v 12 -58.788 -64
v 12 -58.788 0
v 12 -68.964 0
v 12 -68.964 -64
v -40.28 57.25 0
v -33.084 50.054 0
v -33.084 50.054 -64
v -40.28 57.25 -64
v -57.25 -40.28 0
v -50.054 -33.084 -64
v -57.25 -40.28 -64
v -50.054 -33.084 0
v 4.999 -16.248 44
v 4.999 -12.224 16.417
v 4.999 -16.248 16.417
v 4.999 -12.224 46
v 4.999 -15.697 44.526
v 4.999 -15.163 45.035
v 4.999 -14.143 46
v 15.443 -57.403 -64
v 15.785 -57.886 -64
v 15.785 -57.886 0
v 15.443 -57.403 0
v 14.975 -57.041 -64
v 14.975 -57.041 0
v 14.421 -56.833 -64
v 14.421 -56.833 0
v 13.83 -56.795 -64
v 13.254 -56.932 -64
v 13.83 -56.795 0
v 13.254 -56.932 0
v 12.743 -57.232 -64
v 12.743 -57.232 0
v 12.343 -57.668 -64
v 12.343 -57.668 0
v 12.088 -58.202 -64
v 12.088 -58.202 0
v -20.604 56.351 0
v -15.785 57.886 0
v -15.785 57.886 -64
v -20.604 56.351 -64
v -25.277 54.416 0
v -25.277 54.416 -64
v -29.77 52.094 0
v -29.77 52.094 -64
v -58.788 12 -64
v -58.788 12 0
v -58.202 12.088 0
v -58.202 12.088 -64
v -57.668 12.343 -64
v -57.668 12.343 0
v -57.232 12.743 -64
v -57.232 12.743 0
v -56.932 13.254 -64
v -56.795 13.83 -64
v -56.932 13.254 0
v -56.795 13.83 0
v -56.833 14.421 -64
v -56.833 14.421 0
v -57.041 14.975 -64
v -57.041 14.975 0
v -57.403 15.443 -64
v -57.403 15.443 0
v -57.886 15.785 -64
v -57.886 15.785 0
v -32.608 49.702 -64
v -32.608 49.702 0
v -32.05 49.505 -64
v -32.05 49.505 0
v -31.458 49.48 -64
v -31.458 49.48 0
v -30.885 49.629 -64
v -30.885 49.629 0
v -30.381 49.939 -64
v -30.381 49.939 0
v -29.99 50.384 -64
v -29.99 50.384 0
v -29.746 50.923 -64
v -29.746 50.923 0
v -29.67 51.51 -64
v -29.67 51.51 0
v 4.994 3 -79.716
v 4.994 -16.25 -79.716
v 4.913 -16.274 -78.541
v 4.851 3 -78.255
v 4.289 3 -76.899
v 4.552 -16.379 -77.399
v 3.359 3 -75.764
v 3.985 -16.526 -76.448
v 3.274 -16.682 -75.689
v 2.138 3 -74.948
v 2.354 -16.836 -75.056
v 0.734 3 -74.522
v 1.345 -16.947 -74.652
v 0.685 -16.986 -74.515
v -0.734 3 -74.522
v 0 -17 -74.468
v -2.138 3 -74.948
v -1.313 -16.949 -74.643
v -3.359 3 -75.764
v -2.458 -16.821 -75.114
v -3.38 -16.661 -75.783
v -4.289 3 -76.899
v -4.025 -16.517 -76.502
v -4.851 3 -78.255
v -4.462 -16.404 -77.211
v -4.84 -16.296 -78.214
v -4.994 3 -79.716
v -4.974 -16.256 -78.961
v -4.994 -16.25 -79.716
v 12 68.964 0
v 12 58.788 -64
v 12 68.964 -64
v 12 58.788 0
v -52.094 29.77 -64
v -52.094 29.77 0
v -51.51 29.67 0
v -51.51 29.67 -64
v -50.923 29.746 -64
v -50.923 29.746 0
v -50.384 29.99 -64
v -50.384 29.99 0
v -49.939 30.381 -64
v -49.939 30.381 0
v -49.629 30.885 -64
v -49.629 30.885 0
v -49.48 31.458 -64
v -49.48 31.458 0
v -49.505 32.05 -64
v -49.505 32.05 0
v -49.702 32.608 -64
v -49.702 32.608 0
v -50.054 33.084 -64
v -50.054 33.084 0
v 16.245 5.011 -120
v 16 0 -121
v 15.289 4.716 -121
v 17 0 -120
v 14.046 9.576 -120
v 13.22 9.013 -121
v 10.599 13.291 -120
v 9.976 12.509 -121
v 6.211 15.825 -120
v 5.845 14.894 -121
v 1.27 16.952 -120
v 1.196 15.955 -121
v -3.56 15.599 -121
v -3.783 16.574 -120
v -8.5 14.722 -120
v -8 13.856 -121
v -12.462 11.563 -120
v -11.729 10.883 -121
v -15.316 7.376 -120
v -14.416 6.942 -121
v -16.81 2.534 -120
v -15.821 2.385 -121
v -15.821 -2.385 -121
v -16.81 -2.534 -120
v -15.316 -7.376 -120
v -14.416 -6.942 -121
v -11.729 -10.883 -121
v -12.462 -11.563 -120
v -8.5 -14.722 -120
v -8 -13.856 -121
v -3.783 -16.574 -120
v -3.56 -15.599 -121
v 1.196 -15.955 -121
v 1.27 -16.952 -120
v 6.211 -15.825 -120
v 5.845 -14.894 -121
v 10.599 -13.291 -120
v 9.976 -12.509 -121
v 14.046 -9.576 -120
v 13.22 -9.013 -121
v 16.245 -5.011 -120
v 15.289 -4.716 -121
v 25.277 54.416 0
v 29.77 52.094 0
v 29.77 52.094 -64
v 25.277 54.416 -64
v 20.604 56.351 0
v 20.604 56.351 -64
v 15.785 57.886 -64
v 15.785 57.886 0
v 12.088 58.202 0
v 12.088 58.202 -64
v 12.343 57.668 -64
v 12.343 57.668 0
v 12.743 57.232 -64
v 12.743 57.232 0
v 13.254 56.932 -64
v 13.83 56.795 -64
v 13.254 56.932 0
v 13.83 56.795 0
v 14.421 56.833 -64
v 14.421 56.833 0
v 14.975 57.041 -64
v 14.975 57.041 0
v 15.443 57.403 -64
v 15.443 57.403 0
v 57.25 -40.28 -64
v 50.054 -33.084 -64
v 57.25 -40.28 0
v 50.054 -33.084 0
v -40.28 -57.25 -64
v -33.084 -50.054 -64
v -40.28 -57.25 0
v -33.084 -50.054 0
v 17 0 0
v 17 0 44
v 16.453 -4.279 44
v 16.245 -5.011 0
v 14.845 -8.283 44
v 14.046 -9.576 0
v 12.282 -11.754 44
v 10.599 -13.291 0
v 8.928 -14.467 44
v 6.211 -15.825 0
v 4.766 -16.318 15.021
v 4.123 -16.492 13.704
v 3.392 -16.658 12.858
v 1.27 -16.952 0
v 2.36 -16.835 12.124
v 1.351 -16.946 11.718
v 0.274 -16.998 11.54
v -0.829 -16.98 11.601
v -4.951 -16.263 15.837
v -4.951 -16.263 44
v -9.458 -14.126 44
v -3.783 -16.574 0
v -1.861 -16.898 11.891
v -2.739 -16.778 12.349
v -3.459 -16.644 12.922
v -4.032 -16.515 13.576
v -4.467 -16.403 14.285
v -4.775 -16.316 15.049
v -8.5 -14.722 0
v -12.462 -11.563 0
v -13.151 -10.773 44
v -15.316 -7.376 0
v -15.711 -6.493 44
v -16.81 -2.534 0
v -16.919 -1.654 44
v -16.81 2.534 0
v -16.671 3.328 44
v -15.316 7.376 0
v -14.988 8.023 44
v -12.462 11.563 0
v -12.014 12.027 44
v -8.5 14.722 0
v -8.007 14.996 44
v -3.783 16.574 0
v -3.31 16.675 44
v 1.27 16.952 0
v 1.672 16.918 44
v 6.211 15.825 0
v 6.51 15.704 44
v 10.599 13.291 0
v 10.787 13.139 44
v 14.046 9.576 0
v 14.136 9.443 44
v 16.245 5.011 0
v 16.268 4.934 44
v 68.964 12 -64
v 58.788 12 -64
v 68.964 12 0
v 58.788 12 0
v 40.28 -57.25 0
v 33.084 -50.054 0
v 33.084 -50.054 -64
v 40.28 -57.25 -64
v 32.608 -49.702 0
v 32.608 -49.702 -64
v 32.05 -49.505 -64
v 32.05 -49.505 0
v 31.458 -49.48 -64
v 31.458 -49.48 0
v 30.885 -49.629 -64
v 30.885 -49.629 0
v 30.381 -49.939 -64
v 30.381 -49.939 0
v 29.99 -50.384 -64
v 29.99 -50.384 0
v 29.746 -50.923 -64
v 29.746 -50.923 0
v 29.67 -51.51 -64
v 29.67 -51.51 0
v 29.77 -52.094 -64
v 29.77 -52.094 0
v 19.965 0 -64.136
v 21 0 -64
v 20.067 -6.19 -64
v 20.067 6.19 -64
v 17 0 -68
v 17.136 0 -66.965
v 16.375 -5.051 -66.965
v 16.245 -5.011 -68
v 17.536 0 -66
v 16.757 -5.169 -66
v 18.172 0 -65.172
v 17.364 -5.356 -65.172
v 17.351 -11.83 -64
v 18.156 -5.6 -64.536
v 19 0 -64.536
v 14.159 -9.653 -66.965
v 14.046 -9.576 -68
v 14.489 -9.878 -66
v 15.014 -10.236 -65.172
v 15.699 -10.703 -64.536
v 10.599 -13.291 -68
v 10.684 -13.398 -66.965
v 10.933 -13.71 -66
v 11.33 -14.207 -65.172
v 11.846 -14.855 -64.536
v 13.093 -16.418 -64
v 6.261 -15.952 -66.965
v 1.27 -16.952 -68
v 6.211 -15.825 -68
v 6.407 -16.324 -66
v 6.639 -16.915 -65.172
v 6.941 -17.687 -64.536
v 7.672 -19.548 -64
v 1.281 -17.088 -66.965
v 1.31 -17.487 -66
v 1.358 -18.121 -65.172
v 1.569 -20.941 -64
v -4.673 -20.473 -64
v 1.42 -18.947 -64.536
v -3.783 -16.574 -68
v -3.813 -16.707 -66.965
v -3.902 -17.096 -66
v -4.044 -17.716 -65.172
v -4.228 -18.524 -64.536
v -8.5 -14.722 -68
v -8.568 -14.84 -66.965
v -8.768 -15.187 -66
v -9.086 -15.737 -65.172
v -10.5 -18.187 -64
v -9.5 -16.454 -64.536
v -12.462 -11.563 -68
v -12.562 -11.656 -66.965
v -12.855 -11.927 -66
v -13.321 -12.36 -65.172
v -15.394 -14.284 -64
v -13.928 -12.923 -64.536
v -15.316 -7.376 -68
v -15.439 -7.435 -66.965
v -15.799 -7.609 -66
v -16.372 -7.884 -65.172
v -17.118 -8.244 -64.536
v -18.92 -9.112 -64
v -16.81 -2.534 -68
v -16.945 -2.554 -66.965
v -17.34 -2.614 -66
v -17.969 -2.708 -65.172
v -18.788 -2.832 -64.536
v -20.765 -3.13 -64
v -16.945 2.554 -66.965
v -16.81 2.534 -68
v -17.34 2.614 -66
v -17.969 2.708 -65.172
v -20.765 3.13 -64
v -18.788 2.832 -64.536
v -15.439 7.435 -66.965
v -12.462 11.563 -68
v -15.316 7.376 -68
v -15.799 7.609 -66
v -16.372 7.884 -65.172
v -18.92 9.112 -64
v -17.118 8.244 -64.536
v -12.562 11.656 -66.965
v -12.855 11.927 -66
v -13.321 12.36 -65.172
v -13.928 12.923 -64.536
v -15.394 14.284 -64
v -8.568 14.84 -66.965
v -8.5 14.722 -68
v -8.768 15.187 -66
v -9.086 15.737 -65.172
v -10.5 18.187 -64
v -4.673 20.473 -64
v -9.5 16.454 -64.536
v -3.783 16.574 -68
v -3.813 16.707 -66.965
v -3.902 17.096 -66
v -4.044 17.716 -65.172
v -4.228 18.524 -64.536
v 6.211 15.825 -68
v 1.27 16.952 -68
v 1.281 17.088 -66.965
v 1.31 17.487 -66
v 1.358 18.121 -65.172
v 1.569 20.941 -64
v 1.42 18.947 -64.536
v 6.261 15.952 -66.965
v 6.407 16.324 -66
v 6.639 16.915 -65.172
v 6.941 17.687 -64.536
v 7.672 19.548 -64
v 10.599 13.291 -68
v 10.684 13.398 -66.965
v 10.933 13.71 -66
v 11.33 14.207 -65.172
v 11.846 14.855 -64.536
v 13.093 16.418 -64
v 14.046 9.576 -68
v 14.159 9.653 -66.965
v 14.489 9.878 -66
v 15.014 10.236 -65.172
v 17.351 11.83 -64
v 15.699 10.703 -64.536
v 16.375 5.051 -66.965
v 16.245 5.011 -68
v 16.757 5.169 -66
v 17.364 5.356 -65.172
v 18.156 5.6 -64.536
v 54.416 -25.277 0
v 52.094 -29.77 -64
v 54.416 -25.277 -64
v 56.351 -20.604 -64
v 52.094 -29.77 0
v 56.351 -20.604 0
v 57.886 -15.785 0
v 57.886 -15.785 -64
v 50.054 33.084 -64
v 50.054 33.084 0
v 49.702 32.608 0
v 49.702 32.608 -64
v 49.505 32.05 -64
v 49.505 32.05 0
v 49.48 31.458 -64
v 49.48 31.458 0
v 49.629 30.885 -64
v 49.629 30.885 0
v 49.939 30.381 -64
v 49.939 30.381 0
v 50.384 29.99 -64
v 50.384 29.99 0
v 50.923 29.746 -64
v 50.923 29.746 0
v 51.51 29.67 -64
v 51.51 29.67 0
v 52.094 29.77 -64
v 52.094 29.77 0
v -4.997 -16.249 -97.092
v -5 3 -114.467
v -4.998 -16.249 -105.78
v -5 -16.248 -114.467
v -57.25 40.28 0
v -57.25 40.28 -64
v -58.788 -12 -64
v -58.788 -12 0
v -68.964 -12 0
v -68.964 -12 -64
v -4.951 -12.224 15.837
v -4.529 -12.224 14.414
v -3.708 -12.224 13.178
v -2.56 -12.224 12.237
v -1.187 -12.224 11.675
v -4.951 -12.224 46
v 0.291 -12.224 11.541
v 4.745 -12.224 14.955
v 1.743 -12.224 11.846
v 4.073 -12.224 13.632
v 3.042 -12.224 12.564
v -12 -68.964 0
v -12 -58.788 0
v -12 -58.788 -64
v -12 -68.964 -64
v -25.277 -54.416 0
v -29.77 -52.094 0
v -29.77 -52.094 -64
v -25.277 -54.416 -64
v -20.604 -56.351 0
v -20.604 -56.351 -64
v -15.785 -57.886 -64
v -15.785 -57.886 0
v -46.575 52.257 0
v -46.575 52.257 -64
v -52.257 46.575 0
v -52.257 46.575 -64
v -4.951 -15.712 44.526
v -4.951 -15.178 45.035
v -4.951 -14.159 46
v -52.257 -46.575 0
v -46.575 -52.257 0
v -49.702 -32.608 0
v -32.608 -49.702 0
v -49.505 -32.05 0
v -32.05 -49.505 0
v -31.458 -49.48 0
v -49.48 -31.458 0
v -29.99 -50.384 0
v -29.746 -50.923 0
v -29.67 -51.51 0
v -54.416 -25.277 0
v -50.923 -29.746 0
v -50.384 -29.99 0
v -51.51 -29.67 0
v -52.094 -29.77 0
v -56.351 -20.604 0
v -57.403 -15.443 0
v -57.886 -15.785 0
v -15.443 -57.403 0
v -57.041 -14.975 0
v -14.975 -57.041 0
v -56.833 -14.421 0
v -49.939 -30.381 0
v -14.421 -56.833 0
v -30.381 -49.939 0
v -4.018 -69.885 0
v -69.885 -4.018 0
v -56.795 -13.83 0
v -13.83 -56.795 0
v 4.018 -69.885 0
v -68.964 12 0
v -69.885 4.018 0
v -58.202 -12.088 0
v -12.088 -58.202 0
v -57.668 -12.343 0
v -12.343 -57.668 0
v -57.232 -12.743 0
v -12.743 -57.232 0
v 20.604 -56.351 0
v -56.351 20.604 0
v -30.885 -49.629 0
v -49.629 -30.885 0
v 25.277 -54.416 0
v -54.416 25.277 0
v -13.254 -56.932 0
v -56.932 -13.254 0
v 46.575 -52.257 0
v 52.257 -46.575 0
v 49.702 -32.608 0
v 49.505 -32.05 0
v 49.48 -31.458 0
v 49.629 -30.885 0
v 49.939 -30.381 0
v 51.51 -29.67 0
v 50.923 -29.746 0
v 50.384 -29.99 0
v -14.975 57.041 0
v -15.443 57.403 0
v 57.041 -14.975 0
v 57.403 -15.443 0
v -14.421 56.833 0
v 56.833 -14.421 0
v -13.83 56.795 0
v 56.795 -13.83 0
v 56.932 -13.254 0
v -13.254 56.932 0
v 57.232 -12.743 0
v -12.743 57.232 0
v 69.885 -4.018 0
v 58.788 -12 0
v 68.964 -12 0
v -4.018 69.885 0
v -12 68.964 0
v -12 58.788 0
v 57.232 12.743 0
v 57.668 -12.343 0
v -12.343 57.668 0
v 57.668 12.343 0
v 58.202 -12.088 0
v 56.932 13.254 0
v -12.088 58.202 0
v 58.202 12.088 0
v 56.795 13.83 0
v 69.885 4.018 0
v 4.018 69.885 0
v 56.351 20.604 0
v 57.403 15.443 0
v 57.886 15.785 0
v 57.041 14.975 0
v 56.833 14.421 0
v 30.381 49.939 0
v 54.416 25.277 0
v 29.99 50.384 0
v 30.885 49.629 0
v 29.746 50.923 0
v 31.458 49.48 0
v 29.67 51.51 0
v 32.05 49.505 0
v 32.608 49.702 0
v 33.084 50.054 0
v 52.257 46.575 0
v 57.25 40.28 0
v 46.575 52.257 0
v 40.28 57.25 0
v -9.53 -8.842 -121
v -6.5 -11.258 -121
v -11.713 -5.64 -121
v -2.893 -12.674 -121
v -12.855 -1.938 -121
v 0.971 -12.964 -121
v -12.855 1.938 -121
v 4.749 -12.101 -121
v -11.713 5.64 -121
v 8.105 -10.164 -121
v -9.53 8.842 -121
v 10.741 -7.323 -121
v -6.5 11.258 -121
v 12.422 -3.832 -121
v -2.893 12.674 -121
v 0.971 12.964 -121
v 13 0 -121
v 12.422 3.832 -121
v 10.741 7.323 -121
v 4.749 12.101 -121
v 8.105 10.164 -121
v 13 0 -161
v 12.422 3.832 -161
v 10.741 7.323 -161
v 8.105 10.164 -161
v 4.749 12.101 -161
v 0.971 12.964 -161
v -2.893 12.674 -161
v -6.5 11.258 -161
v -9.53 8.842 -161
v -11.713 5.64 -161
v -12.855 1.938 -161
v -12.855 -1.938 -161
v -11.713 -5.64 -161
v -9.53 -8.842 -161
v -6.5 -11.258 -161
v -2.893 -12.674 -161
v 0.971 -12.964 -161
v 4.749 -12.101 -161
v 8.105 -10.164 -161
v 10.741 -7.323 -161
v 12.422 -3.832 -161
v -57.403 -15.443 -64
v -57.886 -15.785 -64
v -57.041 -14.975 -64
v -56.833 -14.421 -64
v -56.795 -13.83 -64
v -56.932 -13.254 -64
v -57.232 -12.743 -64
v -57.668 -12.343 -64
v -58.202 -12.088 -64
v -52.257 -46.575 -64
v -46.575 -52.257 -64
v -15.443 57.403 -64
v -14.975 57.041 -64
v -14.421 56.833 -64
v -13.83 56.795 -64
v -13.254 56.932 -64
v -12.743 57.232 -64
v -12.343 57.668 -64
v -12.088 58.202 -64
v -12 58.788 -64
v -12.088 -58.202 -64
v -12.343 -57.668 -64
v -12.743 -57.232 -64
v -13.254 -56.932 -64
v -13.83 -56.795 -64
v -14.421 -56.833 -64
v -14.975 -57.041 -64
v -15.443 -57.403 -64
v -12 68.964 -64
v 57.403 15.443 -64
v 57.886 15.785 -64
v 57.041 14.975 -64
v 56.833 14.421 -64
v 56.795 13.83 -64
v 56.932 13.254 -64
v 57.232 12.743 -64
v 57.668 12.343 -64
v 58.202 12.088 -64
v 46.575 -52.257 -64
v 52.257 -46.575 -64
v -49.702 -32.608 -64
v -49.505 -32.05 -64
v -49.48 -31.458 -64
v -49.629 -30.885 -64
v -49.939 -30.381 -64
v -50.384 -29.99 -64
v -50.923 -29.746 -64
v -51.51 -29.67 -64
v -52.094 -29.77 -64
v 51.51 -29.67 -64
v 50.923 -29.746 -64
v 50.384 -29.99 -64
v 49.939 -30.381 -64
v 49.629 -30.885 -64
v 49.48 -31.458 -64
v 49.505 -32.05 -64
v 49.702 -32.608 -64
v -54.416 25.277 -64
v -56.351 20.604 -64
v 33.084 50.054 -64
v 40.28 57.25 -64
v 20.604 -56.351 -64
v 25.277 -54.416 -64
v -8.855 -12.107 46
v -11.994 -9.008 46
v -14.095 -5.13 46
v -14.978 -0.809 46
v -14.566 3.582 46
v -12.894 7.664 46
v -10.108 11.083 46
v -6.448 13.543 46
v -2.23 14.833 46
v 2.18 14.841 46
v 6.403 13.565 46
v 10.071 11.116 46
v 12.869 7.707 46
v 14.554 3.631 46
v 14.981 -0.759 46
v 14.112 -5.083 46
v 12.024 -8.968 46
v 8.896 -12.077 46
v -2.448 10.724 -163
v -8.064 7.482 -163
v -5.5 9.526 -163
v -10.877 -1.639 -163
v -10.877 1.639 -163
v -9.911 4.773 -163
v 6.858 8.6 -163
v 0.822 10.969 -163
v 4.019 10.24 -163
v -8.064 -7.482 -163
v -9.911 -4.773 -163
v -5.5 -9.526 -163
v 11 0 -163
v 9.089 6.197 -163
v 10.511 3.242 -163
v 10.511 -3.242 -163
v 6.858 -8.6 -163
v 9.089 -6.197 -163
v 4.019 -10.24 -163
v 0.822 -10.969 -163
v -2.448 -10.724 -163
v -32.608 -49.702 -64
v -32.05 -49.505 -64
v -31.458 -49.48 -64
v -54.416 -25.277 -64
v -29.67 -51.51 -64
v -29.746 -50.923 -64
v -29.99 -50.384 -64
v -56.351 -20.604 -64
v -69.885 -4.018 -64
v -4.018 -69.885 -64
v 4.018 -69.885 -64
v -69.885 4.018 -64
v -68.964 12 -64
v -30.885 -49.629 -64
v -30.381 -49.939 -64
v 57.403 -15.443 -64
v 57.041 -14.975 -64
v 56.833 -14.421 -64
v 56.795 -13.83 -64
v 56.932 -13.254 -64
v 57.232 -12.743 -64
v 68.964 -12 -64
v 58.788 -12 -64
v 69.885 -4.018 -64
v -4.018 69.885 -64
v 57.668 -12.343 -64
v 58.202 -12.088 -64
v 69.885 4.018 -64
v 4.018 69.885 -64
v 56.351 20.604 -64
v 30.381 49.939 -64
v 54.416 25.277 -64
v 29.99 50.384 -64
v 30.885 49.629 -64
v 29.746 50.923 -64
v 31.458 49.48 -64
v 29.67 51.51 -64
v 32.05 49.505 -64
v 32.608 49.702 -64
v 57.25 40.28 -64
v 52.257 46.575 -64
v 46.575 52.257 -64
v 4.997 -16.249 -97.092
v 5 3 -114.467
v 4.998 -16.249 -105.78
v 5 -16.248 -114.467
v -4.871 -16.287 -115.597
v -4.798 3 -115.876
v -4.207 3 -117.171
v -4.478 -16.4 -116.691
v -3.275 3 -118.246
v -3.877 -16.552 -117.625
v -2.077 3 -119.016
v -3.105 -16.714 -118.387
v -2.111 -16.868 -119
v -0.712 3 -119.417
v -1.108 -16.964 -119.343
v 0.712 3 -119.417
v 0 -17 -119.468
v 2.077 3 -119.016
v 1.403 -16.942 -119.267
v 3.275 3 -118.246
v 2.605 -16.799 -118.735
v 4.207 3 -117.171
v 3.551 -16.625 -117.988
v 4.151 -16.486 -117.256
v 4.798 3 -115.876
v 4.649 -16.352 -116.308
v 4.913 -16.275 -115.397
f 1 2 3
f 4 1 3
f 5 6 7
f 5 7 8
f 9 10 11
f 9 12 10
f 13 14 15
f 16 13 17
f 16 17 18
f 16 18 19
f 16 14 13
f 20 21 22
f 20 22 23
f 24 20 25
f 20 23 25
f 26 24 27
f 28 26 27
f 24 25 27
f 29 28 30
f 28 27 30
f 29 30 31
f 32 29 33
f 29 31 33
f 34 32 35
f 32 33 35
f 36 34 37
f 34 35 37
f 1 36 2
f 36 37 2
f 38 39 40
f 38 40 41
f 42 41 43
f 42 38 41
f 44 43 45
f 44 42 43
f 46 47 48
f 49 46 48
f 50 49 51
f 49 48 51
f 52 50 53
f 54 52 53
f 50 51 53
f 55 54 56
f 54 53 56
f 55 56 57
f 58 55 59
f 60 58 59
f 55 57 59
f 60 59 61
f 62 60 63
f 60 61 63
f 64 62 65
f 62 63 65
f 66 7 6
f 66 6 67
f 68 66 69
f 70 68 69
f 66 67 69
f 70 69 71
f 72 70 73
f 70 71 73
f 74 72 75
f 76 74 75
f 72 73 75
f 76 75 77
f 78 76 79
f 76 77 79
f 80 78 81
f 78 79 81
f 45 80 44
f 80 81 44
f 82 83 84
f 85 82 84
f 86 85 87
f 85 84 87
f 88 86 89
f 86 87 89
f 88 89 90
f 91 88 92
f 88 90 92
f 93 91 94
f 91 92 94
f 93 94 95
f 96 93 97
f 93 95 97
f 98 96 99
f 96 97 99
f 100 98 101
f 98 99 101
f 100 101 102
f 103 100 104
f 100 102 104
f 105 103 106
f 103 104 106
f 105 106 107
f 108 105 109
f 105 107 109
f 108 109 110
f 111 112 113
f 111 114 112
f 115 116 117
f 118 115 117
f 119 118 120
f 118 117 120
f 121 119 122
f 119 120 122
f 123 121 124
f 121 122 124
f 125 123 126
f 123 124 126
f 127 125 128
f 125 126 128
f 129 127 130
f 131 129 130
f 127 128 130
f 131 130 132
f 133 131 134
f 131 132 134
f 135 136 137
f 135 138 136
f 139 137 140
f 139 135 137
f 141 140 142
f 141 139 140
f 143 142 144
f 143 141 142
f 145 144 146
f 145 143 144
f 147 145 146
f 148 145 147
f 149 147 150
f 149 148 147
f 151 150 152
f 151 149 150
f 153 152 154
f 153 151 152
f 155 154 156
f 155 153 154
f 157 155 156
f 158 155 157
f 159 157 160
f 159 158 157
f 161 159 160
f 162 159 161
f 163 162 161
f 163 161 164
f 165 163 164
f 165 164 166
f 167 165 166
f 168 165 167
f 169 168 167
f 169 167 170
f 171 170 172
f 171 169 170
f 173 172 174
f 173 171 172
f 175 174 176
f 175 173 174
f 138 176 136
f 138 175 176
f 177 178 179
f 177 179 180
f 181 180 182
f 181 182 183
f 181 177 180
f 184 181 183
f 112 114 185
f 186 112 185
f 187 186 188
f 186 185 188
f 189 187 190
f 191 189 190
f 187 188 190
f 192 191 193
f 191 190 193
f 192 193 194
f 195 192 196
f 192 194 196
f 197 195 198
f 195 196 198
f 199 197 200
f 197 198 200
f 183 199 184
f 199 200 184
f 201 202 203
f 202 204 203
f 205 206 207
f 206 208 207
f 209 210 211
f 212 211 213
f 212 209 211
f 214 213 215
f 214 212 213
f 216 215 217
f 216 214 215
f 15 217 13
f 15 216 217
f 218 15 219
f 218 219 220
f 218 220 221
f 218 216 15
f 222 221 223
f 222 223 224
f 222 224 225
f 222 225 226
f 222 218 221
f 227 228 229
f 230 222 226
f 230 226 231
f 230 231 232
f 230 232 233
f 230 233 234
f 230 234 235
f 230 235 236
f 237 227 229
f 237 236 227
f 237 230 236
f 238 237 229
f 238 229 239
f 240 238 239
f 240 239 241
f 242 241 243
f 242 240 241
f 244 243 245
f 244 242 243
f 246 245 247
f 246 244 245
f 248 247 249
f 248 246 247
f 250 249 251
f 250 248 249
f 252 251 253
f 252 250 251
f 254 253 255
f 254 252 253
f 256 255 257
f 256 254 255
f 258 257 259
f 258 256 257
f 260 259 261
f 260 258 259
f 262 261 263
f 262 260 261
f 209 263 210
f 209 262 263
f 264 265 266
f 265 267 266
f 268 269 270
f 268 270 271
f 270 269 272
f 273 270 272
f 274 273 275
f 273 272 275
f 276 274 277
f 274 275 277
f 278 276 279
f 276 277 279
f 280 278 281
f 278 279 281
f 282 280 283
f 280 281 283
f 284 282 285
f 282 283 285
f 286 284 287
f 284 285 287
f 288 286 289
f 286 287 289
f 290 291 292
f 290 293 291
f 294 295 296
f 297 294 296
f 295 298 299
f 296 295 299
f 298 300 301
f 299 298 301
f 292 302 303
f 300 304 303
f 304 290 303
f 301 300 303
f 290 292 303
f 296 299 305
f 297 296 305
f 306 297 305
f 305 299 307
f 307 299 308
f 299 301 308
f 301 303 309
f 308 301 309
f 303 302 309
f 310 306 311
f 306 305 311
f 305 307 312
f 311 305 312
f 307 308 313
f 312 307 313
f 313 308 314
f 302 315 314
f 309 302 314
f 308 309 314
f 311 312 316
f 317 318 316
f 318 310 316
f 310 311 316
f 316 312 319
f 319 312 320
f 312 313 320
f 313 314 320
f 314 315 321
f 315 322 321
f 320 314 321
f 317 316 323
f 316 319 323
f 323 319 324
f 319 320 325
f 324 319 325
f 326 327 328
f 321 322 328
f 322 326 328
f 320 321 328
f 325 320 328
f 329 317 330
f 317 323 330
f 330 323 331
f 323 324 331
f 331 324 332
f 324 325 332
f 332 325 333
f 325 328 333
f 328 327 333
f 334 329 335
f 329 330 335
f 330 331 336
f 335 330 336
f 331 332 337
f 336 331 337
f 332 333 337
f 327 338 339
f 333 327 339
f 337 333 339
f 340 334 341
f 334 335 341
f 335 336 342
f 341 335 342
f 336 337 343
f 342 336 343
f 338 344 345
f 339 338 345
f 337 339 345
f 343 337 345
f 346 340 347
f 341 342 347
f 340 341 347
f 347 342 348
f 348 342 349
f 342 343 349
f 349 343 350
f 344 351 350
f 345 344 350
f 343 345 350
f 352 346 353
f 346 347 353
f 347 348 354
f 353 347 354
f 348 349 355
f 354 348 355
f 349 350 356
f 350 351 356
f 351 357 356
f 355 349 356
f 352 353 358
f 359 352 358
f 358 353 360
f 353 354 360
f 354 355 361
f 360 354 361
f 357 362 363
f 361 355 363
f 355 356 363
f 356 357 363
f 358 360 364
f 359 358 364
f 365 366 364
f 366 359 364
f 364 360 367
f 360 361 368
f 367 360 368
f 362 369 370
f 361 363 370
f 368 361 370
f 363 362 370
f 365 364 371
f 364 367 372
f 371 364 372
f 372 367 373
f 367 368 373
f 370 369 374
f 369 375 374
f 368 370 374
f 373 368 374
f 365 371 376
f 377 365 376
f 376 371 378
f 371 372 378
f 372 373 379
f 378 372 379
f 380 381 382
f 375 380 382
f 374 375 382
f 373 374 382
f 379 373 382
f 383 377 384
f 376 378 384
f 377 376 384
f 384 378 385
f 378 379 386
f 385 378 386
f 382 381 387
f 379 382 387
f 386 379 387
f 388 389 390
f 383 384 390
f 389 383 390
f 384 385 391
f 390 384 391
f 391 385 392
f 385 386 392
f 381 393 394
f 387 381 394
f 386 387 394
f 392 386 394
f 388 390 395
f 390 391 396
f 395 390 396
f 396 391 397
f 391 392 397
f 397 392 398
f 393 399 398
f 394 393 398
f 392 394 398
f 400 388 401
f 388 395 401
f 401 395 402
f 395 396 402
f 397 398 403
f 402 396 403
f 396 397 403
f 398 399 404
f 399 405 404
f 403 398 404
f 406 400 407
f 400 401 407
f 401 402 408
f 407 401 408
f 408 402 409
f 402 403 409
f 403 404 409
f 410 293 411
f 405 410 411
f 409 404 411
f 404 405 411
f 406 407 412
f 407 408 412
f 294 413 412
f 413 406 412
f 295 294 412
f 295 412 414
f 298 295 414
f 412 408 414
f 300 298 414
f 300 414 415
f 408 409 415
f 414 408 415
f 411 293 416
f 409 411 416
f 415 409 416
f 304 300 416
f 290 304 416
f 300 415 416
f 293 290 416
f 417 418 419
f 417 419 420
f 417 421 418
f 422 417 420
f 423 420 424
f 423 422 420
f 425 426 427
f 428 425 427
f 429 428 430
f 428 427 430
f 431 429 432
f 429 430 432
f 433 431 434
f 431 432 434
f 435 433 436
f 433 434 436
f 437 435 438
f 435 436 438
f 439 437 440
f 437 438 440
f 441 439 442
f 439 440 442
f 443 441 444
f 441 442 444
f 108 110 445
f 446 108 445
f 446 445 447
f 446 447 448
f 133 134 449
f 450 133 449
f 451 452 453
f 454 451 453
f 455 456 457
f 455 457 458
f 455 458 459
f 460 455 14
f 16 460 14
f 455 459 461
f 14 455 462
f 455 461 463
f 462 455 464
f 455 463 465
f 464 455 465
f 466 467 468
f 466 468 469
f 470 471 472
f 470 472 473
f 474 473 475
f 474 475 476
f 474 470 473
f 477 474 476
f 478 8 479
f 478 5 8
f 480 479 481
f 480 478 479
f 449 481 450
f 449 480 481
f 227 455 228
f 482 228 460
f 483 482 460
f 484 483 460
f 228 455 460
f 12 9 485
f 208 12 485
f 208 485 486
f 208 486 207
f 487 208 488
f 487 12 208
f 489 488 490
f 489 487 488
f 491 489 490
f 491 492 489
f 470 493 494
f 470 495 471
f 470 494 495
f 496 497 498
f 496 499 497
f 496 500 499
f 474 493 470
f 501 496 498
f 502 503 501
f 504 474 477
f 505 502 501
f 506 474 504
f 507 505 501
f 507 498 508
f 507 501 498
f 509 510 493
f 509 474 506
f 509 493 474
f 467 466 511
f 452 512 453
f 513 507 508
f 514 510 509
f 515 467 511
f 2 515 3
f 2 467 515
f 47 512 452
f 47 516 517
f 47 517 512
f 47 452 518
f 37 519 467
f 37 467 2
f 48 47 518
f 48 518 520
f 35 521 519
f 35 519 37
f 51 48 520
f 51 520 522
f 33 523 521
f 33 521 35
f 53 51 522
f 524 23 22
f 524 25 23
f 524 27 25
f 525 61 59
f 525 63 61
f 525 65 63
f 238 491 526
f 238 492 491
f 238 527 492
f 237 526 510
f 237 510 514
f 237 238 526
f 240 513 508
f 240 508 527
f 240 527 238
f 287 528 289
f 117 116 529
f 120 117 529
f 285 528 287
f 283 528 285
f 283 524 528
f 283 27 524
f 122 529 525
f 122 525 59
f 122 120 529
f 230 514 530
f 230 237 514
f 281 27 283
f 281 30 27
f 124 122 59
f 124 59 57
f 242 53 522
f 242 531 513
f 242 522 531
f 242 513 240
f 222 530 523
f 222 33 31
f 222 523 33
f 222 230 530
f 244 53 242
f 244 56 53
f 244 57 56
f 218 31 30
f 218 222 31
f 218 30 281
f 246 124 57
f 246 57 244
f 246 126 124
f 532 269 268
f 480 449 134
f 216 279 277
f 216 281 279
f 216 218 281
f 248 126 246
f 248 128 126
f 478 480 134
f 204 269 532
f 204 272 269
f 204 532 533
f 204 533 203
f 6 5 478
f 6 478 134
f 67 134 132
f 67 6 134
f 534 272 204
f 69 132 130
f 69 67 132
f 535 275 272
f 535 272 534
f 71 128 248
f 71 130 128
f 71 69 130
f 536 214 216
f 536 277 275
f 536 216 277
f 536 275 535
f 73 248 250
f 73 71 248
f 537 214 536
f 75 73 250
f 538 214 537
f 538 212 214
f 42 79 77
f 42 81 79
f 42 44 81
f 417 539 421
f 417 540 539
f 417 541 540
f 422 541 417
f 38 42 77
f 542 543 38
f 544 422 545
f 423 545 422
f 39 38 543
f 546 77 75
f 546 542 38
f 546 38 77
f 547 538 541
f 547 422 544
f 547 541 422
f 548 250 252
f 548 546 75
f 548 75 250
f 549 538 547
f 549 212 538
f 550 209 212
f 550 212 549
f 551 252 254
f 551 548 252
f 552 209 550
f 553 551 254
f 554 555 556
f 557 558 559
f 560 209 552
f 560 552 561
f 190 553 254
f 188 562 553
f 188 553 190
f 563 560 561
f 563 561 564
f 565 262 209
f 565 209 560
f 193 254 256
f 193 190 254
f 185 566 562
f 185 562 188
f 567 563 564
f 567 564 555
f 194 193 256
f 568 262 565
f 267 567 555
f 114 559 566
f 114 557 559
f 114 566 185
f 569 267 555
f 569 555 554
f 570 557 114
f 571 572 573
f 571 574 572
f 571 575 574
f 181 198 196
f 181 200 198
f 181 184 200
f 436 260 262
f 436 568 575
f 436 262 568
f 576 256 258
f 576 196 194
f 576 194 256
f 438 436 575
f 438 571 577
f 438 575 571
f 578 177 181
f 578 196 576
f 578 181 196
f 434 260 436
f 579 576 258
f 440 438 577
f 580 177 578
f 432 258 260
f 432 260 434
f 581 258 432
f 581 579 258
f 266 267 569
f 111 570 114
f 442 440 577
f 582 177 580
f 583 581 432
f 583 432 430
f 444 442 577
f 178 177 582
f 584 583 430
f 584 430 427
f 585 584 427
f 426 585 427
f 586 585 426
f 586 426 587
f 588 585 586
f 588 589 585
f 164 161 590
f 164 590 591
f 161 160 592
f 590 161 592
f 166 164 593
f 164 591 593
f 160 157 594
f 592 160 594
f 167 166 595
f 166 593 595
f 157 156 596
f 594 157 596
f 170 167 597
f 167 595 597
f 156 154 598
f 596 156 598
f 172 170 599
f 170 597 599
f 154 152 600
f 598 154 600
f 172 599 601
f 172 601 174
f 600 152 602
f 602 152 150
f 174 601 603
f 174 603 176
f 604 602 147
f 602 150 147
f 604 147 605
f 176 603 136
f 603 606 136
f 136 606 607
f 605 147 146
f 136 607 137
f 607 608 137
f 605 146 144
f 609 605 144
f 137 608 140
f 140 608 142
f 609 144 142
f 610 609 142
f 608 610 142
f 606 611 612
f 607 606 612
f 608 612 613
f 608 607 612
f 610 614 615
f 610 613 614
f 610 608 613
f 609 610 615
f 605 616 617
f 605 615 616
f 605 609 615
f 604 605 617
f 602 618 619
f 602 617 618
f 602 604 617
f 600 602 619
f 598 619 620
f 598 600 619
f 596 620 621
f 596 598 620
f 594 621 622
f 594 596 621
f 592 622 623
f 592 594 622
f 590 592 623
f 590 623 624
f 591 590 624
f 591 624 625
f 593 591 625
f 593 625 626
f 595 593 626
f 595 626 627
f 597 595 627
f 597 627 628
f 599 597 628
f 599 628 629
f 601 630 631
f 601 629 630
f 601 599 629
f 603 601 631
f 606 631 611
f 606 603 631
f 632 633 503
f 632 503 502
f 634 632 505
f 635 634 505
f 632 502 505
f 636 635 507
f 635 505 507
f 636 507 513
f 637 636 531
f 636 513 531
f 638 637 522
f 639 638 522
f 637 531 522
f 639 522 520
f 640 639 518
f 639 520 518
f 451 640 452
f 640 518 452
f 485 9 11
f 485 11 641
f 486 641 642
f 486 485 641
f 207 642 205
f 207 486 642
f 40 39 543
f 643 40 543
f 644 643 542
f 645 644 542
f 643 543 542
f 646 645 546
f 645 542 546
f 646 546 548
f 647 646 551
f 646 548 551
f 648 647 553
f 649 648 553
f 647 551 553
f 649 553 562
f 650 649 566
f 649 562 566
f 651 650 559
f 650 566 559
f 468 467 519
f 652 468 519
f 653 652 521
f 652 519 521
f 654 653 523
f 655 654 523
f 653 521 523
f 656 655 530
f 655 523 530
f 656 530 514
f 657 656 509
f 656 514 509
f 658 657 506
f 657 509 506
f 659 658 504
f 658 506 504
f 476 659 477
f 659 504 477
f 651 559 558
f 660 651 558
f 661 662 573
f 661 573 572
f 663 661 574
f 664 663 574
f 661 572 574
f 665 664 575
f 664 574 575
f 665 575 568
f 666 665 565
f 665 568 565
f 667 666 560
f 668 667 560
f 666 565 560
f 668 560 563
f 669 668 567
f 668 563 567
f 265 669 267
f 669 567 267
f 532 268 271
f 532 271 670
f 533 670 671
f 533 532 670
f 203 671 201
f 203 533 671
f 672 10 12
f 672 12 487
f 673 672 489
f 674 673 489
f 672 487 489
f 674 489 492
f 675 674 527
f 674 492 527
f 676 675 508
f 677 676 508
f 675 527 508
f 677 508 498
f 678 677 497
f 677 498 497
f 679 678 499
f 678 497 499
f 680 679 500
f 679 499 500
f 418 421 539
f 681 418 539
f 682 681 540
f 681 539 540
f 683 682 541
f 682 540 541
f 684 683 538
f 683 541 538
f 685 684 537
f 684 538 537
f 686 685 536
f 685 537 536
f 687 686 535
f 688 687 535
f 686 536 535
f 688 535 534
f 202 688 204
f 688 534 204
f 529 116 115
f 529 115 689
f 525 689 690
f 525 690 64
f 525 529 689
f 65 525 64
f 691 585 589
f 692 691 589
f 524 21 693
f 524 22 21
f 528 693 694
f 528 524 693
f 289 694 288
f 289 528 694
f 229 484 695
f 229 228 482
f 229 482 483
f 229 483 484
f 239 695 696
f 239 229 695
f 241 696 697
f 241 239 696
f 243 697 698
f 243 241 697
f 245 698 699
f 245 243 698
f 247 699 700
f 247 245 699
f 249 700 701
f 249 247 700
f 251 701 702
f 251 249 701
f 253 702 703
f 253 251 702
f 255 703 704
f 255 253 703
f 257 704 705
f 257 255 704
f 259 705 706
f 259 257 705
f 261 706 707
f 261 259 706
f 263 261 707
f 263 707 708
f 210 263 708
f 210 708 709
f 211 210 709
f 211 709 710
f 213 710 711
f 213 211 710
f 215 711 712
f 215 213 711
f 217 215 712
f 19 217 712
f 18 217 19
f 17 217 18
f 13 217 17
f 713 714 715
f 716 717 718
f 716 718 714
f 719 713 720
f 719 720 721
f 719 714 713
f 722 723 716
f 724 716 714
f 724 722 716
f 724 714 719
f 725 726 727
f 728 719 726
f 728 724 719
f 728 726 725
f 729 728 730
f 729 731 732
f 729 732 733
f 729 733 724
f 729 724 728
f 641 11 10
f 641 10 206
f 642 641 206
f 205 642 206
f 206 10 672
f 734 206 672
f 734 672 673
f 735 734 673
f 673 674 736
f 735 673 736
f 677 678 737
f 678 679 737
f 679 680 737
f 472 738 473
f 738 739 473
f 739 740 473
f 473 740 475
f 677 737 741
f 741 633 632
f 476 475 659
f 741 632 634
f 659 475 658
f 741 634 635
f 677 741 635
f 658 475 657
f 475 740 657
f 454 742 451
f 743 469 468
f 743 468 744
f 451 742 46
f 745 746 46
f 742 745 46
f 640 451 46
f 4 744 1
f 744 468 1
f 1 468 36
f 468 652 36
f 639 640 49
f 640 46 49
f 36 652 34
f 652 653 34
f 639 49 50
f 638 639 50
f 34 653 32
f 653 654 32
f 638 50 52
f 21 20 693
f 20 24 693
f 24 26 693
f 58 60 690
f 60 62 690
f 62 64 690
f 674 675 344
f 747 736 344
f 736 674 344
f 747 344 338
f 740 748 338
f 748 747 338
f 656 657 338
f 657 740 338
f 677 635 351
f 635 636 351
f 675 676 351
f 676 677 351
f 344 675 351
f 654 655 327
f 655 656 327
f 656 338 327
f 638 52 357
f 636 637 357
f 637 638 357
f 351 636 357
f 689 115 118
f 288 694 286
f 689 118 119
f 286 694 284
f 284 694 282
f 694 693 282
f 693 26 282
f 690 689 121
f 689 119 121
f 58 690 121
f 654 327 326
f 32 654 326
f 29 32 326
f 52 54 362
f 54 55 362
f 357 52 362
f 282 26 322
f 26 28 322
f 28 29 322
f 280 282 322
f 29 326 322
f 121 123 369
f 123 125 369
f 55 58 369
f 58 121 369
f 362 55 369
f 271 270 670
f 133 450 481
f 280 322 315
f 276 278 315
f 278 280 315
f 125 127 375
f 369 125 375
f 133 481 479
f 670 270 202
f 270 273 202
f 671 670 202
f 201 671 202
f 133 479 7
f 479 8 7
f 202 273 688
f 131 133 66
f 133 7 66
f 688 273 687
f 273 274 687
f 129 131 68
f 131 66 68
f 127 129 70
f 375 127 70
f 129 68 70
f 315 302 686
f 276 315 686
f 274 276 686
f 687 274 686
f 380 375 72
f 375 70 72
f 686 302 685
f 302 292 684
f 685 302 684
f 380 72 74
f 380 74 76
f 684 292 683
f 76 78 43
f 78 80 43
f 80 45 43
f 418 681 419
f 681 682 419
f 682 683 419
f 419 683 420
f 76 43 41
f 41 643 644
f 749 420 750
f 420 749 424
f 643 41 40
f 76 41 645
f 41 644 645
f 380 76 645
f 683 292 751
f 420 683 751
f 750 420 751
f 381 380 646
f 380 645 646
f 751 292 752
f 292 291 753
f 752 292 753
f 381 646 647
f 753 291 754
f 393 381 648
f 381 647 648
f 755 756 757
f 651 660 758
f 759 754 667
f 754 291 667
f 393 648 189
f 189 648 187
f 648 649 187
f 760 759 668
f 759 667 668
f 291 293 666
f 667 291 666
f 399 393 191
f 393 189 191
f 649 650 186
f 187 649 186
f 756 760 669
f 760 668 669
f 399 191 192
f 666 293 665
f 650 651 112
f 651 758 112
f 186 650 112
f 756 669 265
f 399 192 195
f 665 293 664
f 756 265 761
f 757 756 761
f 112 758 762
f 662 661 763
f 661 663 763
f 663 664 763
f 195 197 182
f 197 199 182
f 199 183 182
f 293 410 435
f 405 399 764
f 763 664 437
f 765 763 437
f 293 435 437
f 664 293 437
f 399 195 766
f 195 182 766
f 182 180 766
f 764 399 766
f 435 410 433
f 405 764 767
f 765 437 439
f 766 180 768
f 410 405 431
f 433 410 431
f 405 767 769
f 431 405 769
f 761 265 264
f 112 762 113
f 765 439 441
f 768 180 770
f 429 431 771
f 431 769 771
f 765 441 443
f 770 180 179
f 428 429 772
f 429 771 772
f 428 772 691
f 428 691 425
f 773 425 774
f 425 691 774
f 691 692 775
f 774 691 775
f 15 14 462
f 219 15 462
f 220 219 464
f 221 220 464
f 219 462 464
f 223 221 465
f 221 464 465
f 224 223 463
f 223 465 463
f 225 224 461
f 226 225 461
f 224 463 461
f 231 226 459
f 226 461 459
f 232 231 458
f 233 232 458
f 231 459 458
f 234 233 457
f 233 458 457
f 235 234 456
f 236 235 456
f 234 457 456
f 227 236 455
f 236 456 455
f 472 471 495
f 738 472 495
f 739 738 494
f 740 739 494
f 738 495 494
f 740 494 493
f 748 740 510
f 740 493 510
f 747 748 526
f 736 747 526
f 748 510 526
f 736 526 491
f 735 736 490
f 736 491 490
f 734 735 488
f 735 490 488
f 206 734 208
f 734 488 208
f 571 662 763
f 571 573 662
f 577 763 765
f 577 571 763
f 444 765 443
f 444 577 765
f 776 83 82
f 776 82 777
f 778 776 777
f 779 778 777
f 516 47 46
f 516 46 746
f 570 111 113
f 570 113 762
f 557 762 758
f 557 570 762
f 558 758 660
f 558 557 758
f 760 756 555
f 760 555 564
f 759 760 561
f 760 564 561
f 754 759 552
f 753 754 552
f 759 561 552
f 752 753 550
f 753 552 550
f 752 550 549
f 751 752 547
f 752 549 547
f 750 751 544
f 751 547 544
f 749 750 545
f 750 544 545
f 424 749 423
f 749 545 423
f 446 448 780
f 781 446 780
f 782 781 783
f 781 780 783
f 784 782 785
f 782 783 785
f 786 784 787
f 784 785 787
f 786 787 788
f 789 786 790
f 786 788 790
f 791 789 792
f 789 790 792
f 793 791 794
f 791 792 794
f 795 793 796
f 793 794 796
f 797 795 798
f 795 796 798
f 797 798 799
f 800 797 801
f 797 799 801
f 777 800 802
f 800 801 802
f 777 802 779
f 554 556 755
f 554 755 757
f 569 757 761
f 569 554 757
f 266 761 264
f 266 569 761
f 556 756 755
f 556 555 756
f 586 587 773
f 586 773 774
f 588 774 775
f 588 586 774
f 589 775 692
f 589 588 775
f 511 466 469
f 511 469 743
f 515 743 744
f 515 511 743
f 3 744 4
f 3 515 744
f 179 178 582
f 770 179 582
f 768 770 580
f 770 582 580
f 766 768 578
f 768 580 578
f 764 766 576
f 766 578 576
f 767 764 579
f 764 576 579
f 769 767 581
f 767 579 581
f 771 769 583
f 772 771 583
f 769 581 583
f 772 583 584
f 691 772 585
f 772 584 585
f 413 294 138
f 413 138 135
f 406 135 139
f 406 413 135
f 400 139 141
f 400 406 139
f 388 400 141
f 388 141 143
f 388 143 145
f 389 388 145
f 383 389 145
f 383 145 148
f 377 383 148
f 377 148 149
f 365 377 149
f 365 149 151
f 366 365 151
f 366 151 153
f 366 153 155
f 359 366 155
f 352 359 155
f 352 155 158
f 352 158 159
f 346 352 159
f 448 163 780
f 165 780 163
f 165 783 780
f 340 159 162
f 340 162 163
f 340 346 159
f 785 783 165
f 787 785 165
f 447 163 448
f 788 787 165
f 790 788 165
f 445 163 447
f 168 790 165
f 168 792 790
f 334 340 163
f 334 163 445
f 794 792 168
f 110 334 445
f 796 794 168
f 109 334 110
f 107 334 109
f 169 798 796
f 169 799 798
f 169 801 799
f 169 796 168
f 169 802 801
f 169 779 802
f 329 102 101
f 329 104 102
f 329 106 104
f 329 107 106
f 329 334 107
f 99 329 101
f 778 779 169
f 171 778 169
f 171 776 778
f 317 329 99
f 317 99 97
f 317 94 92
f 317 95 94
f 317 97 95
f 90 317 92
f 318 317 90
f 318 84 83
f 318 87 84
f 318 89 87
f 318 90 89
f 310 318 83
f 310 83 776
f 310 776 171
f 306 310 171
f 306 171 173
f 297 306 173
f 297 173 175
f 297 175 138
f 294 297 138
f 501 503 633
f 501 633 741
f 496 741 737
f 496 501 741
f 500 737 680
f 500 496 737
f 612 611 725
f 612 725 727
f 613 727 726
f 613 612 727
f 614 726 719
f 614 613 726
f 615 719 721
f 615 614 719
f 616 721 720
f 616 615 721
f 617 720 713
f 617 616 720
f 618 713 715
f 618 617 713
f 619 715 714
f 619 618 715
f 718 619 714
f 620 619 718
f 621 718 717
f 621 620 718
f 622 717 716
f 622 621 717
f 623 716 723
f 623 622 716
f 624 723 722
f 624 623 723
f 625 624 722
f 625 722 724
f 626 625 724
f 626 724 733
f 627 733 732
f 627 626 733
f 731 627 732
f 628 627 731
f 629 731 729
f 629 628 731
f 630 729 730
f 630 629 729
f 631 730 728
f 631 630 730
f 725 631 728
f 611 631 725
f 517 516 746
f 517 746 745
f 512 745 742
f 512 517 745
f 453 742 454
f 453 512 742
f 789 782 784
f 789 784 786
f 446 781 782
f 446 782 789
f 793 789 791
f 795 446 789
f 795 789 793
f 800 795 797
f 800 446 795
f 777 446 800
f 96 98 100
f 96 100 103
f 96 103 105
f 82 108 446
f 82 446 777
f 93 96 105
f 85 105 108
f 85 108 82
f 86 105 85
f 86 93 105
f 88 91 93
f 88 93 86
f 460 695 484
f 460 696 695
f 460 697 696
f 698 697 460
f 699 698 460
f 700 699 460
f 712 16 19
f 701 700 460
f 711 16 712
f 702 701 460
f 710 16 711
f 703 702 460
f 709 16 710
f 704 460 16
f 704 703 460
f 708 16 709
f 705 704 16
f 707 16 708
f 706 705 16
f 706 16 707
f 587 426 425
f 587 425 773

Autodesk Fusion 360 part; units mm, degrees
sketch "Sketch1" plane through (0, 0, 0) normal (0, 0, 1) x (1, 0, 0)
  circle A0 centre (0, 0) radius 17
  line L0 (12, 58.7878) -> (12, 68.9638)
  line L1 (-12, 58.7878) -> (-12, 68.9638)
  arc A1 (12, 68.9638) -> (-12, 68.9638) centre (0, 0) ccw
  line L2 (-50.0545, 33.0839) -> (-57.25, 40.2795)
  arc A2 (-40.2795, 57.25) -> (-57.25, 40.2795) centre (0, 0) ccw
  line L3 (-33.0839, 50.0545) -> (-40.2795, 57.25)
  line L4 (-58.7878, -12) -> (-68.9638, -12)
  arc A3 (-68.9638, 12) -> (-68.9638, -12) centre (0, 0) ccw
  line L5 (-58.7878, 12) -> (-68.9638, 12)
  line L6 (-33.0839, -50.0545) -> (-40.2795, -57.25)
  arc A4 (-57.25, -40.2795) -> (-40.2795, -57.25) centre (0, 0) ccw
  line L7 (-50.0545, -33.0839) -> (-57.25, -40.2795)
  line L8 (12, -58.7878) -> (12, -68.9638)
  arc A5 (-12, -68.9638) -> (12, -68.9638) centre (0, 0) ccw
  line L9 (-12, -58.7878) -> (-12, -68.9638)
  line L10 (50.0545, -33.0839) -> (57.25, -40.2795)
  arc A6 (40.2795, -57.25) -> (57.25, -40.2795) centre (0, 0) ccw
  line L11 (33.0839, -50.0545) -> (40.2795, -57.25)
  line L12 (58.7878, 12) -> (68.9638, 12)
  arc A7 (68.9638, -12) -> (68.9638, 12) centre (0, 0) ccw
  line L13 (58.7878, -12) -> (68.9638, -12)
  line L14 (33.0839, 50.0545) -> (40.2795, 57.25)
  arc A8 (57.25, 40.2795) -> (40.2795, 57.25) centre (0, 0) ccw
  line L15 (50.0545, 33.0839) -> (57.25, 40.2795)
  line L16 (31.6697, 51.4687) -> (33.0839, 50.0545) construction
  line L17 (14, 58.7878) -> (12, 58.7878) construction
  arc A9 (12, 58.7878) -> (15.7853, 57.8863) centre (14, 58.7878) ccw
  arc A10 (29.7699, 52.0937) -> (33.0839, 50.0545) centre (31.6697, 51.4687) ccw
  arc A11 (29.7699, 52.0937) -> (15.7853, 57.8863) centre (0, 0) ccw
  arc A12 (-15.7853, 57.8863) -> (-29.7699, 52.0937) centre (0, 0) ccw
  arc A13 (-52.0937, 29.7699) -> (-57.8863, 15.7853) centre (0, 0) ccw
  arc A14 (15.7853, -57.8863) -> (29.7699, -52.0937) centre (0, 0) ccw
  arc A15 (-57.8863, -15.7853) -> (-52.0937, -29.7699) centre (0, 0) ccw
  arc A16 (-29.7699, -52.0937) -> (-15.7853, -57.8863) centre (0, 0) ccw
  arc A17 (52.0937, -29.7699) -> (57.8863, -15.7853) centre (0, 0) ccw
  arc A18 (57.8863, 15.7853) -> (52.0937, 29.7699) centre (0, 0) ccw
  arc A19 (-33.0839, 50.0545) -> (-29.7699, 52.0937) centre (-31.6697, 51.4687) ccw
  arc A20 (-15.7853, 57.8863) -> (-12, 58.7878) centre (-14, 58.7878) ccw
  arc A21 (-58.7878, 12) -> (-57.8863, 15.7853) centre (-58.7878, 14) ccw
  arc A22 (-52.0937, 29.7699) -> (-50.0545, 33.0839) centre (-51.4687, 31.6697) ccw
  arc A23 (-50.0545, -33.0839) -> (-52.0937, -29.7699) centre (-51.4687, -31.6697) ccw
  arc A24 (-57.8863, -15.7853) -> (-58.7878, -12) centre (-58.7878, -14) ccw
  arc A25 (-12, -58.7878) -> (-15.7853, -57.8863) centre (-14, -58.7878) ccw
  arc A26 (-29.7699, -52.0937) -> (-33.0839, -50.0545) centre (-31.6697, -51.4687) ccw
  arc A27 (33.0839, -50.0545) -> (29.7699, -52.0937) centre (31.6697, -51.4687) ccw
  arc A28 (15.7853, -57.8863) -> (12, -58.7878) centre (14, -58.7878) ccw
  arc A29 (58.7878, -12) -> (57.8863, -15.7853) centre (58.7878, -14) ccw
  arc A30 (52.0937, -29.7699) -> (50.0545, -33.0839) centre (51.4687, -31.6697) ccw
  arc A31 (50.0545, 33.0839) -> (52.0937, 29.7699) centre (51.4687, 31.6697) ccw
  arc A32 (57.8863, 15.7853) -> (58.7878, 12) centre (58.7878, 14) ccw
  dimension "d1" = 140
  dimension "d2" = 120
  dimension "d3" = 34
  dimension "d4" = 24
  dimension "d7" = 360
  dimension "d8" = 4
  dimension "d9" = 4
  dimension "d11" = 360
extrude "Extrude1" add sketch "Sketch1" along normal blind 46 and the other way blind 121 contours A0
extrude "Extrude2" add sketch "Sketch1" against normal blind 64
sketch "Sketch2" plane through (0, 0, -121) normal (0, 0, -1) x (1, 0, 0)
  circle A0 centre (0, 0) radius 17
  circle A1 centre (0, 0) radius 13
  dimension "d18" = 26
extrude "Extrude3" add sketch "Sketch2" along normal blind 42 contours A1
ref_plane "WorkPlane1" through (0, 17, 24.5322) normal (0, 1, 0) x (1, 0, 0)
ref_plane "WorkPlane2" through (0, -12.224, 24.5322) normal (0, 1, 0) x (1, 0, 0)
sketch "Sketch3" plane through (0, -12.224, 24.5322) normal (0, 1, 0) x (1, 0, 0)
  line L0 (0, -21) -> (0, 21) construction
  line L1 (-4.9514, 8.6954) -> (-4.9514, -21.5)
  line L2 (4.9987, 8.1155) -> (4.9987, -21.5)
  line L3 (4.9987, -21.5) -> (-4.9514, -21.5)
  arc A0 (4.9987, 7.8845) -> (-4.9514, 7.3046) centre (0, 8) ccw
  dimension "d23" = 10
  dimension "d24" = 29
extrude "Extrude4" cut sketch "Sketch3" against normal blind 13 contours L1 L2 L3 A0
ref_plane "WorkPlane3" through (0, -17, -95.604) normal (0, -1, 0) x (-1, 0, 0)
sketch "Sketch4" plane through (0, 0, 0) normal (0, 0, 1) x (1, 0, 0)
sketch "Sketch5" plane through (0, -17, -95.604) normal (0, -1, 0) x (1, 0, 0)
  line L0 (-4.9938, 15.8882) -> (-5, -18.8629)
  line L1 (4.9938, 15.8882) -> (5, -18.8629)
  arc A0 (-4.9514, 111.4408) -> (4.9987, 112.0207) centre (0, 112.1362) ccw
  arc A1 (4.9938, 15.8882) -> (-4.9938, 15.8882) centre (0, 16.1362) ccw
  arc A2 (-5, -18.8629) -> (5, -18.8629) centre (0, -18.8638) ccw
  dimension "d28" = 10
  dimension "d29" = 10
  dimension "d30" = 35
  dimension "d31" = 96
extrude "Extrude5" cut sketch "Sketch5" against normal blind 20
chamfer "Chamfer1" distance 2 angle 45 2 edges at (-12.1203, 4.701, -163) (-0.0247, 17, 46)
chamfer "Chamfer2" distance 1 angle 45 1 edges at (-15.8496, 6.1475, -121)
fillet "Fillet1" radius 4 1 edges at (-15.8496, 6.1475, -64)
